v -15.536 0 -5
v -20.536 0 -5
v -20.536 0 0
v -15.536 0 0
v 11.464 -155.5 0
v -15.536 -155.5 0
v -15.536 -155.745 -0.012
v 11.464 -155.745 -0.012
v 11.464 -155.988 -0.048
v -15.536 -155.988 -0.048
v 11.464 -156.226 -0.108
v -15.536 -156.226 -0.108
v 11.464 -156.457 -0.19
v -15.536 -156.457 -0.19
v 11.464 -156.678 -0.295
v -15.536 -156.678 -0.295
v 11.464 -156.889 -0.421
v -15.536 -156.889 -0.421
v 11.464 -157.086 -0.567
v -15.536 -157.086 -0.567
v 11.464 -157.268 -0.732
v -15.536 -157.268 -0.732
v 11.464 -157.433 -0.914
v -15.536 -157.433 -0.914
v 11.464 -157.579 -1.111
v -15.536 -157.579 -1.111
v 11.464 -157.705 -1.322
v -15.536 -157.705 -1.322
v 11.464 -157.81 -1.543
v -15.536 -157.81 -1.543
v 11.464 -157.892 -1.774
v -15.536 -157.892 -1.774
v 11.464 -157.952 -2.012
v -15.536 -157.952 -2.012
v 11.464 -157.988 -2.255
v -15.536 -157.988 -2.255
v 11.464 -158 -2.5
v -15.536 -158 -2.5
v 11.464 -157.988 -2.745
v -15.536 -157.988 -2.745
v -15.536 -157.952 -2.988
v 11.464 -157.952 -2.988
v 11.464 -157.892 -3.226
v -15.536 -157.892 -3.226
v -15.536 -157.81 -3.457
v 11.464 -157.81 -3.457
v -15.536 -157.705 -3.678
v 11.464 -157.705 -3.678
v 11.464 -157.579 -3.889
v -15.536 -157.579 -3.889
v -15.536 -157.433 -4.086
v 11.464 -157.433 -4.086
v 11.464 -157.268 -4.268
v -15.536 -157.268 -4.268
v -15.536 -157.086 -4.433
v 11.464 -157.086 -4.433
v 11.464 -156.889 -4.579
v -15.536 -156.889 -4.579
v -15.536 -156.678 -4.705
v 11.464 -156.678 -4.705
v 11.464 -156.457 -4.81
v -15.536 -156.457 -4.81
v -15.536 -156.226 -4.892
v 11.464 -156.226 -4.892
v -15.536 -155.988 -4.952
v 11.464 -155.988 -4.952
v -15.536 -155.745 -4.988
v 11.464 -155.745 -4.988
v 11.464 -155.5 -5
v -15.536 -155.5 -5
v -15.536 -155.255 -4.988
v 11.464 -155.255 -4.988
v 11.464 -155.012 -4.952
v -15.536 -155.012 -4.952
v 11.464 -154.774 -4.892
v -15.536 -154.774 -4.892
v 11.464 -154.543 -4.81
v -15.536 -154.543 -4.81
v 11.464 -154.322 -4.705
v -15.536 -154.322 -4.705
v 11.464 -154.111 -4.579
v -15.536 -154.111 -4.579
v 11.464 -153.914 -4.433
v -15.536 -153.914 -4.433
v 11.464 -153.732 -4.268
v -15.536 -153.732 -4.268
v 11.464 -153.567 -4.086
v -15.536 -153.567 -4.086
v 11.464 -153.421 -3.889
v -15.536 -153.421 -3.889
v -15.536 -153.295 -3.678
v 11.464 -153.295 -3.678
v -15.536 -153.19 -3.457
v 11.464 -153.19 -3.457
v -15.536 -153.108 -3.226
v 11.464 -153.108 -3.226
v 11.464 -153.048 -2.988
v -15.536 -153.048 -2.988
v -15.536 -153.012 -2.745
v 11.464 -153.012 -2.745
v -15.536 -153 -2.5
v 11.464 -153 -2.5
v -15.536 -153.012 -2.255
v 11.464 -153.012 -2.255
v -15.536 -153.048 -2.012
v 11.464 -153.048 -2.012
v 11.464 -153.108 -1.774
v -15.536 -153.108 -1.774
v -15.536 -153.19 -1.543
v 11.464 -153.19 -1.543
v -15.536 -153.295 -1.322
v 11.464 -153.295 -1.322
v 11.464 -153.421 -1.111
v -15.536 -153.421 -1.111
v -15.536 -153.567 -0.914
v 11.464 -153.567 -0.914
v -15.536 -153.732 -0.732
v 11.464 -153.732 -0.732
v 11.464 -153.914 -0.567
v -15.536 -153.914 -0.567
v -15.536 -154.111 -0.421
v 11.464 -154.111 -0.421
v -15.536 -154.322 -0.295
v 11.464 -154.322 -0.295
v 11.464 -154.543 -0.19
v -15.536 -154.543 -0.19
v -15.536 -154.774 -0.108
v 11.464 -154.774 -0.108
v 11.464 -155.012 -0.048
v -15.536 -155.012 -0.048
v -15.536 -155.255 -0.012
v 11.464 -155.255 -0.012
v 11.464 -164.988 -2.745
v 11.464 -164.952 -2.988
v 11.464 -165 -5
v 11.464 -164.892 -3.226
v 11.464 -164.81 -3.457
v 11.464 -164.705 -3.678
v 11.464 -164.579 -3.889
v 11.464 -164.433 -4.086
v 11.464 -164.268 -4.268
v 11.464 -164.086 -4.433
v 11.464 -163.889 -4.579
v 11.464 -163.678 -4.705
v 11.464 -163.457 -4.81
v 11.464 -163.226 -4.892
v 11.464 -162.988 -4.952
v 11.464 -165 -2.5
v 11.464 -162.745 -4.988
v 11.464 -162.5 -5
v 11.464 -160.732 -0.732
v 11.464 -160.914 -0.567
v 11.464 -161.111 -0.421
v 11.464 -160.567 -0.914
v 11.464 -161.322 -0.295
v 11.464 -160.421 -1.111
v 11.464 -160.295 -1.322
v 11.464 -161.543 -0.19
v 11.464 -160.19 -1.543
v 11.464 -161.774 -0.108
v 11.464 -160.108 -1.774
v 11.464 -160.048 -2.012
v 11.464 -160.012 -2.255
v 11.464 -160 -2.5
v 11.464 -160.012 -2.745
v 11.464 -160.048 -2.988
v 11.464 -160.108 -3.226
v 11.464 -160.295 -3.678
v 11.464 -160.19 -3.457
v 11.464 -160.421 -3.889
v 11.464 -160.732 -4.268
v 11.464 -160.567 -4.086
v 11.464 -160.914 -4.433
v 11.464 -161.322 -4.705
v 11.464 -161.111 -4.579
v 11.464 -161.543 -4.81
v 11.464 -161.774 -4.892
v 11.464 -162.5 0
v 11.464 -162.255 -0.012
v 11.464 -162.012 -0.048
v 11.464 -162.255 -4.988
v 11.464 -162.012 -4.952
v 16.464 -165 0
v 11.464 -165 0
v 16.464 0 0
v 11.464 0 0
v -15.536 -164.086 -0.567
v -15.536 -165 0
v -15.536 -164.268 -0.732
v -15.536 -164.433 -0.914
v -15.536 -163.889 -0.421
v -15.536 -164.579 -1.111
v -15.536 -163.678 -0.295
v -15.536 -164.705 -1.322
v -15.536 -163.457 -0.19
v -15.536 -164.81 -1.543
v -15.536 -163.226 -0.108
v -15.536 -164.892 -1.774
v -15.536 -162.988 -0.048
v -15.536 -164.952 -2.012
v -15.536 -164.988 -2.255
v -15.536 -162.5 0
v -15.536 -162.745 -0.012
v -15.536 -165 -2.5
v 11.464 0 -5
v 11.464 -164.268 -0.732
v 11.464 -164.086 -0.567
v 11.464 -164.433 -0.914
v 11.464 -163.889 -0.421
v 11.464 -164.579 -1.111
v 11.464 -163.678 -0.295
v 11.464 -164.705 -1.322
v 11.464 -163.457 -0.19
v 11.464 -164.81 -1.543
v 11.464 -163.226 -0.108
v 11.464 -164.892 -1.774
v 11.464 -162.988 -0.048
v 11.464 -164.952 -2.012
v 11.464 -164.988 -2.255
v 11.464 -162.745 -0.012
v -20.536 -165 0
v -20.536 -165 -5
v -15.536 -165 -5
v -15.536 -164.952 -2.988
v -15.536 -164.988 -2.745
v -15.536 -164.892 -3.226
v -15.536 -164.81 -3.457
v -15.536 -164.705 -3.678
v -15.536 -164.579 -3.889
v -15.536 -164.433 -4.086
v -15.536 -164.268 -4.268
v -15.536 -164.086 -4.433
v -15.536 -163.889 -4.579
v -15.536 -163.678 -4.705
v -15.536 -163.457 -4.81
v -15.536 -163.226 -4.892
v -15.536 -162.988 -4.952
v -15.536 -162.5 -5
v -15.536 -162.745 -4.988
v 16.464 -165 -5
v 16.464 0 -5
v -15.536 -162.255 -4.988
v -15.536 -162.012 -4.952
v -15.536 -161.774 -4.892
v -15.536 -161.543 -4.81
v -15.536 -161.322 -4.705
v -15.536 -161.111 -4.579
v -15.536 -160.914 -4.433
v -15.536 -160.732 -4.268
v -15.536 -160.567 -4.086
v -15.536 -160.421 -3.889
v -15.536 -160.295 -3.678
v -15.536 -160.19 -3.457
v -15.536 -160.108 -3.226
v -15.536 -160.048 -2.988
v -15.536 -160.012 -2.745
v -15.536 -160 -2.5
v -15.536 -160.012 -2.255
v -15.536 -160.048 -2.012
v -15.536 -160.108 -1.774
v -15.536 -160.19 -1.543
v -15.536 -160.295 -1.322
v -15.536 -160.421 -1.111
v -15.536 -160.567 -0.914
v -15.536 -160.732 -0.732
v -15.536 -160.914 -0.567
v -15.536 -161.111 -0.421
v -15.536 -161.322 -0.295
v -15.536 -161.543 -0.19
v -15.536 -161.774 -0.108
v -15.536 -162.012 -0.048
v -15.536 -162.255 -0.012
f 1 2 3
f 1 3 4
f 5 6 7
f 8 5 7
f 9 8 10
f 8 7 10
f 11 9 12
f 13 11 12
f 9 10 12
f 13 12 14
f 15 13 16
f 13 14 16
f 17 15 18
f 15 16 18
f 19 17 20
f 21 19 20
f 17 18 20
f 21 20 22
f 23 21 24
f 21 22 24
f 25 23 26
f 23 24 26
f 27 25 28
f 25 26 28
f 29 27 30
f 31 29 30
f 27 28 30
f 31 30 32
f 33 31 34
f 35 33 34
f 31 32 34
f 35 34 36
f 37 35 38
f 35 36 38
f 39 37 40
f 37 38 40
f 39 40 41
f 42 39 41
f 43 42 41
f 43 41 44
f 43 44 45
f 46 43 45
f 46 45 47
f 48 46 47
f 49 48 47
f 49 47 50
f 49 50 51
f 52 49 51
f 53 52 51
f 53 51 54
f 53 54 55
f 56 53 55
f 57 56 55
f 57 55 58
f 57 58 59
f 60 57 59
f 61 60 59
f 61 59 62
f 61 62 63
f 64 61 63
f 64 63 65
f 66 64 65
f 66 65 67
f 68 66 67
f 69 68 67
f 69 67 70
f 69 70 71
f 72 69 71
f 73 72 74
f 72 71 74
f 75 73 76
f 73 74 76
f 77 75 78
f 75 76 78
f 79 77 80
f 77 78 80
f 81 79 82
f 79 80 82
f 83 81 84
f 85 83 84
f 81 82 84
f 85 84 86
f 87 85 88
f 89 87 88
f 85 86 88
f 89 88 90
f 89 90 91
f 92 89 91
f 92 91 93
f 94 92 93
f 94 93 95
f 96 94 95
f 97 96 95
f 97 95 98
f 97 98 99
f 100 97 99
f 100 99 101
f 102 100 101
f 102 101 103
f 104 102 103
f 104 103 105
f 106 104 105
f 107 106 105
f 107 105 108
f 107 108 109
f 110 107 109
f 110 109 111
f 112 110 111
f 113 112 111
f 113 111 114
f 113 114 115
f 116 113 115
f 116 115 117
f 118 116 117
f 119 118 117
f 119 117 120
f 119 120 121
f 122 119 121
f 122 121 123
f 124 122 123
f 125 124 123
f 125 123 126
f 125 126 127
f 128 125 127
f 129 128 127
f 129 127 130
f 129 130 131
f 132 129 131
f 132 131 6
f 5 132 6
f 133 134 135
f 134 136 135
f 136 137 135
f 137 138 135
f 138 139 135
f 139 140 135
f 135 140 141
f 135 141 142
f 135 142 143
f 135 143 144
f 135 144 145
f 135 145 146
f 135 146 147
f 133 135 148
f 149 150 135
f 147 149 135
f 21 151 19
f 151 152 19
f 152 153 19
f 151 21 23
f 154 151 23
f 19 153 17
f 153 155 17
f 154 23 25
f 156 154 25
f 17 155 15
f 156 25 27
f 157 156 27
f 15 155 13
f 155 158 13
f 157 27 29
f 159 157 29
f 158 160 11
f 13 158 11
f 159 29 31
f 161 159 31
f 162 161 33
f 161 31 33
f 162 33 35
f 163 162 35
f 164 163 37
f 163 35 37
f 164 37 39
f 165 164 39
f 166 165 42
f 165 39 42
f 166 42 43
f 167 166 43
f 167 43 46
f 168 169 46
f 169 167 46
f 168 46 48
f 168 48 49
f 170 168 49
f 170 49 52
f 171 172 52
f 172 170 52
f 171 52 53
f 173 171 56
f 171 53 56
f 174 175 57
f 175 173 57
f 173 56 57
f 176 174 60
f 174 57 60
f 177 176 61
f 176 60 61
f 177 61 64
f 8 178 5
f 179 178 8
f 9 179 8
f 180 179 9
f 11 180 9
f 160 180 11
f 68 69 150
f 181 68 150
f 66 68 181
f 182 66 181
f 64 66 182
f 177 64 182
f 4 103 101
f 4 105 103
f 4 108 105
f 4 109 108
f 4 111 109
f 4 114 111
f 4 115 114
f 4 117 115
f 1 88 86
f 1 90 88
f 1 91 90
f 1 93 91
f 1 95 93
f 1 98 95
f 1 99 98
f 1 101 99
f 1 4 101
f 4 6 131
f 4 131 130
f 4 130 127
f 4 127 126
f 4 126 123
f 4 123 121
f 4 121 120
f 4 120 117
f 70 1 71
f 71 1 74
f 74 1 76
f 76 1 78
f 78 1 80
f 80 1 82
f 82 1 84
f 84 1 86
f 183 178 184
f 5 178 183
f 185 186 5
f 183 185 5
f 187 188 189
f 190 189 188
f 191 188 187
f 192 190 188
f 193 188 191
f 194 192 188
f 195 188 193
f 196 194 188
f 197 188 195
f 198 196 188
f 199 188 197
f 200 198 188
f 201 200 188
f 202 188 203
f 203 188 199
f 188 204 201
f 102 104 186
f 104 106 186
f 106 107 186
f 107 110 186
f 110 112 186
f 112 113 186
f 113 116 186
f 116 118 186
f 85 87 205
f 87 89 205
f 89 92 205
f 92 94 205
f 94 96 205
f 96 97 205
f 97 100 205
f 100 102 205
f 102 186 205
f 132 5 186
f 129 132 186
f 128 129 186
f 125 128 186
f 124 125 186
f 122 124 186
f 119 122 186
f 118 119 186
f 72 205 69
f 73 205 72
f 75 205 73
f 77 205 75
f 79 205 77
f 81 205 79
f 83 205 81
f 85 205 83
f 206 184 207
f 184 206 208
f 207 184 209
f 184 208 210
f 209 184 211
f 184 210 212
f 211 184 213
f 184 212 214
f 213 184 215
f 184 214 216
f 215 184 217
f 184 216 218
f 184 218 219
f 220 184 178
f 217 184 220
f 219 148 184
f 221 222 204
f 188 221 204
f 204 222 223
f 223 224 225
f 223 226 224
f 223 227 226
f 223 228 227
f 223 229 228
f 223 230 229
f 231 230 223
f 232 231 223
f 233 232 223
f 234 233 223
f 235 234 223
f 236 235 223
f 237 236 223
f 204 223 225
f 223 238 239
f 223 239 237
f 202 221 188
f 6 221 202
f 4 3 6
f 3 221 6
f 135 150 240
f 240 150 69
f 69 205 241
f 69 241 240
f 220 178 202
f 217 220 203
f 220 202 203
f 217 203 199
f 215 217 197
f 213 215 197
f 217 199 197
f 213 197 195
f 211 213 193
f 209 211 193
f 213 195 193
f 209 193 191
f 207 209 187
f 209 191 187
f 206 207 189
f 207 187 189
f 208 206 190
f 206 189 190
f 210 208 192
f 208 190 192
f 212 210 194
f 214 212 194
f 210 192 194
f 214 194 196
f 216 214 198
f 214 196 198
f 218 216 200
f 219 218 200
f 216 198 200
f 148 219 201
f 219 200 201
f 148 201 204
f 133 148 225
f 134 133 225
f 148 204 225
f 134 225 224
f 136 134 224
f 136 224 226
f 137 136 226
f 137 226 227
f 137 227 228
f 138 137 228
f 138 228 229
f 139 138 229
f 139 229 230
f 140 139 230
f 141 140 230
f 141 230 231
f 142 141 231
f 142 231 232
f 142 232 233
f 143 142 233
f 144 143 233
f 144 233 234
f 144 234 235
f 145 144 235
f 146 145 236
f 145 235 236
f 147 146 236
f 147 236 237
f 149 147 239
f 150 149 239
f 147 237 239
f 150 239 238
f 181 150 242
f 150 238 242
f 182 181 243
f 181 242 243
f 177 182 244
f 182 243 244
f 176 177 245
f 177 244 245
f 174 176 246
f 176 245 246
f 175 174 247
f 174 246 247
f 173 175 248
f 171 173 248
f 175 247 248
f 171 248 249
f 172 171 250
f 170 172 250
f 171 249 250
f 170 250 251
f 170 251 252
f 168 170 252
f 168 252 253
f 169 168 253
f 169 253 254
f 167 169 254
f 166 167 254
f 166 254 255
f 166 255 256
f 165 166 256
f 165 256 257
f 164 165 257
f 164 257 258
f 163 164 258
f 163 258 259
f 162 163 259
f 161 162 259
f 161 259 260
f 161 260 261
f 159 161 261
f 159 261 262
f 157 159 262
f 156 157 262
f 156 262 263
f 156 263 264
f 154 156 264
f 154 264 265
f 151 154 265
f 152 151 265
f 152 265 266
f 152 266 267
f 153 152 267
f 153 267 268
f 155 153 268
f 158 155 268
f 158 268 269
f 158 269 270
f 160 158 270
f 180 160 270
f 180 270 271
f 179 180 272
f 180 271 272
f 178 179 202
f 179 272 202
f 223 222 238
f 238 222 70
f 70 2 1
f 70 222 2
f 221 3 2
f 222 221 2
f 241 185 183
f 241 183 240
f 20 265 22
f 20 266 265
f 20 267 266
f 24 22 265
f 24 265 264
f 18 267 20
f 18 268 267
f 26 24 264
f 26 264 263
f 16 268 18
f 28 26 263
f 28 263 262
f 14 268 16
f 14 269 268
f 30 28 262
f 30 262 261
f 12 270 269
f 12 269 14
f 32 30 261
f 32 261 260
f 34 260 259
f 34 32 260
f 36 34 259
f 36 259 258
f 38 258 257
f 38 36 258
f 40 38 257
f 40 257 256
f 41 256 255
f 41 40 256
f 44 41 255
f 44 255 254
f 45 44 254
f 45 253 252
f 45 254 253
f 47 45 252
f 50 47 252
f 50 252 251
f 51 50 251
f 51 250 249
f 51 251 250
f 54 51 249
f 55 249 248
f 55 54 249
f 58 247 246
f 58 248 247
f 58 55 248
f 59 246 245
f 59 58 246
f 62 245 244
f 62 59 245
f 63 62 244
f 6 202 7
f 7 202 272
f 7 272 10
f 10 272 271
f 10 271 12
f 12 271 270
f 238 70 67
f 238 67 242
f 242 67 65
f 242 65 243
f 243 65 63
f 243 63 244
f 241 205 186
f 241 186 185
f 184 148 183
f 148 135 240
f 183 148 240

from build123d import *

# Parameters (mm, degrees)
SKETCH_1_W        = 5
SKETCH_1_H        = 5
EXTRUDE_2_DEPTH   = 165
EXTRUDE_2_2_DEPTH = 165
SKETCH_2_R        = 2.5
EXTRUDE_3_DEPTH   = 27


with BuildPart() as part:
    # ｽｹｯﾁ1 → ﾎﾞｽ - 押し出し2 (new body)
    with BuildSketch(Plane(origin=(0, 0, 0), x_dir=(1, 0, 0), z_dir=(0, 1, 0))):
        with Locations((-18.035714286, 2.5)):
            Rectangle(SKETCH_1_W, SKETCH_1_H)
    extrude(amount=-EXTRUDE_2_DEPTH)



with BuildPart() as body_2:
    # ｽｹｯﾁ1 → Extrude 2 2 (new body)
    with BuildSketch(Plane(origin=(0, 0, 0), x_dir=(1, 0, 0), z_dir=(0, 1, 0))):
        with Locations((13.964285714, 2.5)):
            Rectangle(SKETCH_1_W, SKETCH_1_H)
    extrude(amount=-EXTRUDE_2_2_DEPTH)


with BuildPart() as part_1:
    add(part.part)

    add(body_2.part)  # ﾎﾞｽ - 押し出し3 merges body 2
    # ｽｹｯﾁ2 → ﾎﾞｽ - 押し出し3 (add)
    with BuildSketch(Plane(origin=(-15.535714286, 0, 0), x_dir=(0, 0, -1), z_dir=(1, 0, 0))):
        with Locations(Location((2.5, -162.5, 0), (0, 0, 180))):
            Circle(SKETCH_2_R)
        with Locations(Location((2.5, -155.5, 0), (0, 0, 180))):
            Circle(SKETCH_2_R)
    extrude(amount=EXTRUDE_3_DEPTH)


solid = part_1.part
